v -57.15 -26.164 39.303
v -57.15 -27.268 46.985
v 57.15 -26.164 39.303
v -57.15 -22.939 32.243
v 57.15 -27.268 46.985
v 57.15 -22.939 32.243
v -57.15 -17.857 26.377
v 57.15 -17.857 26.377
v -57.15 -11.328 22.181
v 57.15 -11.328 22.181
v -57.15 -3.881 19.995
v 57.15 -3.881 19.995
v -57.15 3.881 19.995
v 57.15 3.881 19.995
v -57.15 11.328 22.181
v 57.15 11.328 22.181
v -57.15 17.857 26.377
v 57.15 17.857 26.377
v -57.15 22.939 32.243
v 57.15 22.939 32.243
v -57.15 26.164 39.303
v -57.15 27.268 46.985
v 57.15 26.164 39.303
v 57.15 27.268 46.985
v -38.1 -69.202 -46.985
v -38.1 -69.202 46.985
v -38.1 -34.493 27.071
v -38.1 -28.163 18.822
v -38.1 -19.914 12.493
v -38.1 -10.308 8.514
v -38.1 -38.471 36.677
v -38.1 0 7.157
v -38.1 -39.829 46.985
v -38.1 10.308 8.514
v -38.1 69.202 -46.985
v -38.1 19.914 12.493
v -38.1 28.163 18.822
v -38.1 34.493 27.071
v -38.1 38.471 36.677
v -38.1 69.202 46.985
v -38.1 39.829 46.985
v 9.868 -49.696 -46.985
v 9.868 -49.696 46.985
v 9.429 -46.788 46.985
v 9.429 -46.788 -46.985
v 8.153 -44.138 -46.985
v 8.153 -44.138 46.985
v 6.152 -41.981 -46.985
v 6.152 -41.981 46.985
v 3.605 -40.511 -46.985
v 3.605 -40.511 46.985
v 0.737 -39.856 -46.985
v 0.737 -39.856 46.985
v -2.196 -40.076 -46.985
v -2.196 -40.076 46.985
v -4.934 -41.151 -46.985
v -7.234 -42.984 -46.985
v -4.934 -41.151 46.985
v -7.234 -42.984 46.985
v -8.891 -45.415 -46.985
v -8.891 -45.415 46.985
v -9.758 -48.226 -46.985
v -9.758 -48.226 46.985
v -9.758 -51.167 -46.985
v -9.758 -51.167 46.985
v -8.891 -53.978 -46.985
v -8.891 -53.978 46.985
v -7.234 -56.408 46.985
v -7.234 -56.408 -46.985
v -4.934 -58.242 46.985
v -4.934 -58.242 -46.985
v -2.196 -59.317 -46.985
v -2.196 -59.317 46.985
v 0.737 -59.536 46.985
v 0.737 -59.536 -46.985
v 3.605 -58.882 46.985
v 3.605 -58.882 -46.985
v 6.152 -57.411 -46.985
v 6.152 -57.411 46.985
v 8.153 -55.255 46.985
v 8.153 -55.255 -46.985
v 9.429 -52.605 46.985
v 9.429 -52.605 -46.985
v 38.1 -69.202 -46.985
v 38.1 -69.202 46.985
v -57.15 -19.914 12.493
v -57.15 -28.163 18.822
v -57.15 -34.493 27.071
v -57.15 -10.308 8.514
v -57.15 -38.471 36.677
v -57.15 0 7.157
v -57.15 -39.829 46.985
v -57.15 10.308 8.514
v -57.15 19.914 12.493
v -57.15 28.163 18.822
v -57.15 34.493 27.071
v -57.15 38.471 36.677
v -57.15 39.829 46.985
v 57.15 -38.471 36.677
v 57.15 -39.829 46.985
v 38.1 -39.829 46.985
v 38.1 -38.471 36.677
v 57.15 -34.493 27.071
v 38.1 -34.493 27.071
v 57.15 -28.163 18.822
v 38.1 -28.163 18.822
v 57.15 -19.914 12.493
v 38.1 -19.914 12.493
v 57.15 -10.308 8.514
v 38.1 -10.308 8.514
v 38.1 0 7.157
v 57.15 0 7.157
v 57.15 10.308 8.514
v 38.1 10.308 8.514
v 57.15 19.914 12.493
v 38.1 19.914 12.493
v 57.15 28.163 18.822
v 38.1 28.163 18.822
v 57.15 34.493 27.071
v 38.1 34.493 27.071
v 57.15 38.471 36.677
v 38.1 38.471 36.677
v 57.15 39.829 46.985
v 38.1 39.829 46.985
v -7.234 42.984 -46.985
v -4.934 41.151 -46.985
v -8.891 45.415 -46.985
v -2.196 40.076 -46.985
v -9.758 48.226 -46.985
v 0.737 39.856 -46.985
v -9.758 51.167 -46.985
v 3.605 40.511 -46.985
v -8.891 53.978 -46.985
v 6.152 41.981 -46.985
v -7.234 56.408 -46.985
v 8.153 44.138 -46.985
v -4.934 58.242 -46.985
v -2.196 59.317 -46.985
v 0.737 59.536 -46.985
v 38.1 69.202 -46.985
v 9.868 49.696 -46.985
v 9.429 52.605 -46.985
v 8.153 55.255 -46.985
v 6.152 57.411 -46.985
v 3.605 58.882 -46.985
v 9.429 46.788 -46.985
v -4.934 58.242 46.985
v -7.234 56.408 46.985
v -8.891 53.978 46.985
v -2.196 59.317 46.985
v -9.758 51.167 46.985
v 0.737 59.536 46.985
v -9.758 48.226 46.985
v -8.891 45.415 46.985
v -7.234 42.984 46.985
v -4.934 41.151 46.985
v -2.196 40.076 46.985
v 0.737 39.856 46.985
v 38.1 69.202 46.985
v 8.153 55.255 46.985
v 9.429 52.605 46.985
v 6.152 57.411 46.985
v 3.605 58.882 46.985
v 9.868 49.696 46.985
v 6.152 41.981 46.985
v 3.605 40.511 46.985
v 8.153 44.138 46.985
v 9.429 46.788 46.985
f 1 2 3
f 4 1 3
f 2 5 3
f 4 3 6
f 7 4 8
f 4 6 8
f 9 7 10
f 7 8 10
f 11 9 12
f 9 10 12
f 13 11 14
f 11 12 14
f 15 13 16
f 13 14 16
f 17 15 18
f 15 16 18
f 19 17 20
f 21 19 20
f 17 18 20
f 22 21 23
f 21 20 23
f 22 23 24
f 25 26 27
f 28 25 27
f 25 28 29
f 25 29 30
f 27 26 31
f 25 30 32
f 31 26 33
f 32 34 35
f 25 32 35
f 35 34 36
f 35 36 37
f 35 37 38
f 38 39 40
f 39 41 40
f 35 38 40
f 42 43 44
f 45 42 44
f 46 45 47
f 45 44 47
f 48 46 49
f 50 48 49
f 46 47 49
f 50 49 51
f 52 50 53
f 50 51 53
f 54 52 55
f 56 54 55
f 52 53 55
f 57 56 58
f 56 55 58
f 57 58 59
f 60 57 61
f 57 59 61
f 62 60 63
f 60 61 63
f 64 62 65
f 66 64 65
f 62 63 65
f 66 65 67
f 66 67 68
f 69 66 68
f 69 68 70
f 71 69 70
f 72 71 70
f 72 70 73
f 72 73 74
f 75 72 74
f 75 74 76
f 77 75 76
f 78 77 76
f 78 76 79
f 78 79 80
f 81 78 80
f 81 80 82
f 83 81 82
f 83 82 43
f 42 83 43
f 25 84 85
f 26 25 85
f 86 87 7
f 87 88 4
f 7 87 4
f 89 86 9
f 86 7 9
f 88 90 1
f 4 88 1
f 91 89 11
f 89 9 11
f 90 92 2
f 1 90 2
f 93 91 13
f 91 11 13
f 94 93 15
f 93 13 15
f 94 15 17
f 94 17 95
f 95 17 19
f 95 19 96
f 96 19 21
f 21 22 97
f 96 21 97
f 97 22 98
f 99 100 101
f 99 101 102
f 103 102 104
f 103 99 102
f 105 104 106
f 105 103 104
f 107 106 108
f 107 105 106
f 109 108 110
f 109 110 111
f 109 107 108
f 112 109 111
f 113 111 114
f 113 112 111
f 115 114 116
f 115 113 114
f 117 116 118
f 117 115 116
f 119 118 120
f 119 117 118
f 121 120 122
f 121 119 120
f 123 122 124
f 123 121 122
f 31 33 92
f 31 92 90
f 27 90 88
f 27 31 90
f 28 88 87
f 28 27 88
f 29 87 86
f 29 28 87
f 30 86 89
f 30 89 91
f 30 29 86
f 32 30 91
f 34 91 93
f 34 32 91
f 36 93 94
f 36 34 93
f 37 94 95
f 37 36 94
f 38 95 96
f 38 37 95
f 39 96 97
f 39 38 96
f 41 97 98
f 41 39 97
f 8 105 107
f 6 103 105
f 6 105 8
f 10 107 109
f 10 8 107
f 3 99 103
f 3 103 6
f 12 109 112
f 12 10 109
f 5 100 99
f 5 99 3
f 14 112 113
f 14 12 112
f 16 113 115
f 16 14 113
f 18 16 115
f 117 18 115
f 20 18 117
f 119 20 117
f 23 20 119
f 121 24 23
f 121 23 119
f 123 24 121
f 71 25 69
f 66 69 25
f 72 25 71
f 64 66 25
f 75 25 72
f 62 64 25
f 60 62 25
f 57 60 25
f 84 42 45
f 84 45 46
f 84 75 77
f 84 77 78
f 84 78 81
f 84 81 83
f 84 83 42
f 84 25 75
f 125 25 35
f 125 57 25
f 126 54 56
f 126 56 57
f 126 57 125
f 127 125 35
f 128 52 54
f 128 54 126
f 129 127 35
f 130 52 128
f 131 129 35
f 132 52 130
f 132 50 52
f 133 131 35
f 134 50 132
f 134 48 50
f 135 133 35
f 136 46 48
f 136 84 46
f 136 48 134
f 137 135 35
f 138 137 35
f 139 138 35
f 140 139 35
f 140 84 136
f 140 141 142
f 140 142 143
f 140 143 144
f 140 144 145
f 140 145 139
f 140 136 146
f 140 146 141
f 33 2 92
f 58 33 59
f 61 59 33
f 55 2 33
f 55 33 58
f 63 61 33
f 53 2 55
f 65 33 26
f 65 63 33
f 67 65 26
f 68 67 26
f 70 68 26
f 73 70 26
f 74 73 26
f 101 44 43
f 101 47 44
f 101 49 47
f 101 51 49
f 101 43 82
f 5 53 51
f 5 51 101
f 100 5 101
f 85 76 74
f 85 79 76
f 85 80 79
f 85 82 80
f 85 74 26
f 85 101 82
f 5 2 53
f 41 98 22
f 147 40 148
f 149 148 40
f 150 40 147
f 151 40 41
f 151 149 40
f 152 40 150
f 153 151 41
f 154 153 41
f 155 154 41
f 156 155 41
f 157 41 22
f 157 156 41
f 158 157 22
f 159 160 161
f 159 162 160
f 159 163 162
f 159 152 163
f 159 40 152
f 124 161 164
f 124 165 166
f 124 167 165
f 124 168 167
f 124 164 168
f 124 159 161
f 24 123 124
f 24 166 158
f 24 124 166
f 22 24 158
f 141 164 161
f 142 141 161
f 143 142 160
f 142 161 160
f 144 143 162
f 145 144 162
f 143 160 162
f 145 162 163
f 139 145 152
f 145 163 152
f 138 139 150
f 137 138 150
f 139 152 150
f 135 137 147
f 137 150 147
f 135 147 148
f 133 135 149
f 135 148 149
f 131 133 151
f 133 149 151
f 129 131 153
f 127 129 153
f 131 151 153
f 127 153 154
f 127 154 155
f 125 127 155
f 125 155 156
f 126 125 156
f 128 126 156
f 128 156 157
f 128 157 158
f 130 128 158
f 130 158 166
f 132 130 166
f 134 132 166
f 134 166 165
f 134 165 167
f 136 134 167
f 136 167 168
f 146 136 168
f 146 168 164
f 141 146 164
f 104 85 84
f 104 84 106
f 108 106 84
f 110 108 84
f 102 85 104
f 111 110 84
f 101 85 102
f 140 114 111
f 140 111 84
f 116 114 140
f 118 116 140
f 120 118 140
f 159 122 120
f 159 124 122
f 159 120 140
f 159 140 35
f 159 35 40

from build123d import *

# Parameters (mm, degrees)
F0_W     = 138.403788
F0_H     = 93.97047
F1_DEPTH = 38.1
F3_DEPTH = 57.15
F4_R     = 27.26818
F5_DEPTH = 63.5
F6_R     = 9.867741
F7_DEPTH = 203.2


with BuildPart() as f1:
    # F0 (on Right) → F1 (new body, symmetric)
    with BuildSketch(Plane.YZ):
        Rectangle(F0_W, F0_H)
    extrude(amount=F1_DEPTH, both=True)

    # F2 (on Right) → F3 (join, symmetric)
    with BuildSketch(Plane.YZ):
        with BuildLine():
            Line((39.828518, 46.985235), (-39.828518, 46.985235))
            ThreePointArc((-39.828518, 46.985235), (0, 7.156717), (39.828518, 46.985235))
        make_face()
    extrude(amount=F3_DEPTH, both=True)

    # F4 (on Right) → F5 (cut, symmetric)
    with BuildSketch(Plane.YZ):
        with Locations((0, 46.985235)):
            Circle(F4_R)
    extrude(amount=F5_DEPTH, both=True, mode=Mode.SUBTRACT)

    # F6 (on face) → F7 (cut)
    with BuildSketch(Plane.XY.offset(46.985235)):
        with Locations((0, 49.696259)):
            Circle(F6_R)
        with Locations((0, -49.696259)):
            Circle(F6_R)
    extrude(amount=-F7_DEPTH, mode=Mode.SUBTRACT)


solid = f1.part
